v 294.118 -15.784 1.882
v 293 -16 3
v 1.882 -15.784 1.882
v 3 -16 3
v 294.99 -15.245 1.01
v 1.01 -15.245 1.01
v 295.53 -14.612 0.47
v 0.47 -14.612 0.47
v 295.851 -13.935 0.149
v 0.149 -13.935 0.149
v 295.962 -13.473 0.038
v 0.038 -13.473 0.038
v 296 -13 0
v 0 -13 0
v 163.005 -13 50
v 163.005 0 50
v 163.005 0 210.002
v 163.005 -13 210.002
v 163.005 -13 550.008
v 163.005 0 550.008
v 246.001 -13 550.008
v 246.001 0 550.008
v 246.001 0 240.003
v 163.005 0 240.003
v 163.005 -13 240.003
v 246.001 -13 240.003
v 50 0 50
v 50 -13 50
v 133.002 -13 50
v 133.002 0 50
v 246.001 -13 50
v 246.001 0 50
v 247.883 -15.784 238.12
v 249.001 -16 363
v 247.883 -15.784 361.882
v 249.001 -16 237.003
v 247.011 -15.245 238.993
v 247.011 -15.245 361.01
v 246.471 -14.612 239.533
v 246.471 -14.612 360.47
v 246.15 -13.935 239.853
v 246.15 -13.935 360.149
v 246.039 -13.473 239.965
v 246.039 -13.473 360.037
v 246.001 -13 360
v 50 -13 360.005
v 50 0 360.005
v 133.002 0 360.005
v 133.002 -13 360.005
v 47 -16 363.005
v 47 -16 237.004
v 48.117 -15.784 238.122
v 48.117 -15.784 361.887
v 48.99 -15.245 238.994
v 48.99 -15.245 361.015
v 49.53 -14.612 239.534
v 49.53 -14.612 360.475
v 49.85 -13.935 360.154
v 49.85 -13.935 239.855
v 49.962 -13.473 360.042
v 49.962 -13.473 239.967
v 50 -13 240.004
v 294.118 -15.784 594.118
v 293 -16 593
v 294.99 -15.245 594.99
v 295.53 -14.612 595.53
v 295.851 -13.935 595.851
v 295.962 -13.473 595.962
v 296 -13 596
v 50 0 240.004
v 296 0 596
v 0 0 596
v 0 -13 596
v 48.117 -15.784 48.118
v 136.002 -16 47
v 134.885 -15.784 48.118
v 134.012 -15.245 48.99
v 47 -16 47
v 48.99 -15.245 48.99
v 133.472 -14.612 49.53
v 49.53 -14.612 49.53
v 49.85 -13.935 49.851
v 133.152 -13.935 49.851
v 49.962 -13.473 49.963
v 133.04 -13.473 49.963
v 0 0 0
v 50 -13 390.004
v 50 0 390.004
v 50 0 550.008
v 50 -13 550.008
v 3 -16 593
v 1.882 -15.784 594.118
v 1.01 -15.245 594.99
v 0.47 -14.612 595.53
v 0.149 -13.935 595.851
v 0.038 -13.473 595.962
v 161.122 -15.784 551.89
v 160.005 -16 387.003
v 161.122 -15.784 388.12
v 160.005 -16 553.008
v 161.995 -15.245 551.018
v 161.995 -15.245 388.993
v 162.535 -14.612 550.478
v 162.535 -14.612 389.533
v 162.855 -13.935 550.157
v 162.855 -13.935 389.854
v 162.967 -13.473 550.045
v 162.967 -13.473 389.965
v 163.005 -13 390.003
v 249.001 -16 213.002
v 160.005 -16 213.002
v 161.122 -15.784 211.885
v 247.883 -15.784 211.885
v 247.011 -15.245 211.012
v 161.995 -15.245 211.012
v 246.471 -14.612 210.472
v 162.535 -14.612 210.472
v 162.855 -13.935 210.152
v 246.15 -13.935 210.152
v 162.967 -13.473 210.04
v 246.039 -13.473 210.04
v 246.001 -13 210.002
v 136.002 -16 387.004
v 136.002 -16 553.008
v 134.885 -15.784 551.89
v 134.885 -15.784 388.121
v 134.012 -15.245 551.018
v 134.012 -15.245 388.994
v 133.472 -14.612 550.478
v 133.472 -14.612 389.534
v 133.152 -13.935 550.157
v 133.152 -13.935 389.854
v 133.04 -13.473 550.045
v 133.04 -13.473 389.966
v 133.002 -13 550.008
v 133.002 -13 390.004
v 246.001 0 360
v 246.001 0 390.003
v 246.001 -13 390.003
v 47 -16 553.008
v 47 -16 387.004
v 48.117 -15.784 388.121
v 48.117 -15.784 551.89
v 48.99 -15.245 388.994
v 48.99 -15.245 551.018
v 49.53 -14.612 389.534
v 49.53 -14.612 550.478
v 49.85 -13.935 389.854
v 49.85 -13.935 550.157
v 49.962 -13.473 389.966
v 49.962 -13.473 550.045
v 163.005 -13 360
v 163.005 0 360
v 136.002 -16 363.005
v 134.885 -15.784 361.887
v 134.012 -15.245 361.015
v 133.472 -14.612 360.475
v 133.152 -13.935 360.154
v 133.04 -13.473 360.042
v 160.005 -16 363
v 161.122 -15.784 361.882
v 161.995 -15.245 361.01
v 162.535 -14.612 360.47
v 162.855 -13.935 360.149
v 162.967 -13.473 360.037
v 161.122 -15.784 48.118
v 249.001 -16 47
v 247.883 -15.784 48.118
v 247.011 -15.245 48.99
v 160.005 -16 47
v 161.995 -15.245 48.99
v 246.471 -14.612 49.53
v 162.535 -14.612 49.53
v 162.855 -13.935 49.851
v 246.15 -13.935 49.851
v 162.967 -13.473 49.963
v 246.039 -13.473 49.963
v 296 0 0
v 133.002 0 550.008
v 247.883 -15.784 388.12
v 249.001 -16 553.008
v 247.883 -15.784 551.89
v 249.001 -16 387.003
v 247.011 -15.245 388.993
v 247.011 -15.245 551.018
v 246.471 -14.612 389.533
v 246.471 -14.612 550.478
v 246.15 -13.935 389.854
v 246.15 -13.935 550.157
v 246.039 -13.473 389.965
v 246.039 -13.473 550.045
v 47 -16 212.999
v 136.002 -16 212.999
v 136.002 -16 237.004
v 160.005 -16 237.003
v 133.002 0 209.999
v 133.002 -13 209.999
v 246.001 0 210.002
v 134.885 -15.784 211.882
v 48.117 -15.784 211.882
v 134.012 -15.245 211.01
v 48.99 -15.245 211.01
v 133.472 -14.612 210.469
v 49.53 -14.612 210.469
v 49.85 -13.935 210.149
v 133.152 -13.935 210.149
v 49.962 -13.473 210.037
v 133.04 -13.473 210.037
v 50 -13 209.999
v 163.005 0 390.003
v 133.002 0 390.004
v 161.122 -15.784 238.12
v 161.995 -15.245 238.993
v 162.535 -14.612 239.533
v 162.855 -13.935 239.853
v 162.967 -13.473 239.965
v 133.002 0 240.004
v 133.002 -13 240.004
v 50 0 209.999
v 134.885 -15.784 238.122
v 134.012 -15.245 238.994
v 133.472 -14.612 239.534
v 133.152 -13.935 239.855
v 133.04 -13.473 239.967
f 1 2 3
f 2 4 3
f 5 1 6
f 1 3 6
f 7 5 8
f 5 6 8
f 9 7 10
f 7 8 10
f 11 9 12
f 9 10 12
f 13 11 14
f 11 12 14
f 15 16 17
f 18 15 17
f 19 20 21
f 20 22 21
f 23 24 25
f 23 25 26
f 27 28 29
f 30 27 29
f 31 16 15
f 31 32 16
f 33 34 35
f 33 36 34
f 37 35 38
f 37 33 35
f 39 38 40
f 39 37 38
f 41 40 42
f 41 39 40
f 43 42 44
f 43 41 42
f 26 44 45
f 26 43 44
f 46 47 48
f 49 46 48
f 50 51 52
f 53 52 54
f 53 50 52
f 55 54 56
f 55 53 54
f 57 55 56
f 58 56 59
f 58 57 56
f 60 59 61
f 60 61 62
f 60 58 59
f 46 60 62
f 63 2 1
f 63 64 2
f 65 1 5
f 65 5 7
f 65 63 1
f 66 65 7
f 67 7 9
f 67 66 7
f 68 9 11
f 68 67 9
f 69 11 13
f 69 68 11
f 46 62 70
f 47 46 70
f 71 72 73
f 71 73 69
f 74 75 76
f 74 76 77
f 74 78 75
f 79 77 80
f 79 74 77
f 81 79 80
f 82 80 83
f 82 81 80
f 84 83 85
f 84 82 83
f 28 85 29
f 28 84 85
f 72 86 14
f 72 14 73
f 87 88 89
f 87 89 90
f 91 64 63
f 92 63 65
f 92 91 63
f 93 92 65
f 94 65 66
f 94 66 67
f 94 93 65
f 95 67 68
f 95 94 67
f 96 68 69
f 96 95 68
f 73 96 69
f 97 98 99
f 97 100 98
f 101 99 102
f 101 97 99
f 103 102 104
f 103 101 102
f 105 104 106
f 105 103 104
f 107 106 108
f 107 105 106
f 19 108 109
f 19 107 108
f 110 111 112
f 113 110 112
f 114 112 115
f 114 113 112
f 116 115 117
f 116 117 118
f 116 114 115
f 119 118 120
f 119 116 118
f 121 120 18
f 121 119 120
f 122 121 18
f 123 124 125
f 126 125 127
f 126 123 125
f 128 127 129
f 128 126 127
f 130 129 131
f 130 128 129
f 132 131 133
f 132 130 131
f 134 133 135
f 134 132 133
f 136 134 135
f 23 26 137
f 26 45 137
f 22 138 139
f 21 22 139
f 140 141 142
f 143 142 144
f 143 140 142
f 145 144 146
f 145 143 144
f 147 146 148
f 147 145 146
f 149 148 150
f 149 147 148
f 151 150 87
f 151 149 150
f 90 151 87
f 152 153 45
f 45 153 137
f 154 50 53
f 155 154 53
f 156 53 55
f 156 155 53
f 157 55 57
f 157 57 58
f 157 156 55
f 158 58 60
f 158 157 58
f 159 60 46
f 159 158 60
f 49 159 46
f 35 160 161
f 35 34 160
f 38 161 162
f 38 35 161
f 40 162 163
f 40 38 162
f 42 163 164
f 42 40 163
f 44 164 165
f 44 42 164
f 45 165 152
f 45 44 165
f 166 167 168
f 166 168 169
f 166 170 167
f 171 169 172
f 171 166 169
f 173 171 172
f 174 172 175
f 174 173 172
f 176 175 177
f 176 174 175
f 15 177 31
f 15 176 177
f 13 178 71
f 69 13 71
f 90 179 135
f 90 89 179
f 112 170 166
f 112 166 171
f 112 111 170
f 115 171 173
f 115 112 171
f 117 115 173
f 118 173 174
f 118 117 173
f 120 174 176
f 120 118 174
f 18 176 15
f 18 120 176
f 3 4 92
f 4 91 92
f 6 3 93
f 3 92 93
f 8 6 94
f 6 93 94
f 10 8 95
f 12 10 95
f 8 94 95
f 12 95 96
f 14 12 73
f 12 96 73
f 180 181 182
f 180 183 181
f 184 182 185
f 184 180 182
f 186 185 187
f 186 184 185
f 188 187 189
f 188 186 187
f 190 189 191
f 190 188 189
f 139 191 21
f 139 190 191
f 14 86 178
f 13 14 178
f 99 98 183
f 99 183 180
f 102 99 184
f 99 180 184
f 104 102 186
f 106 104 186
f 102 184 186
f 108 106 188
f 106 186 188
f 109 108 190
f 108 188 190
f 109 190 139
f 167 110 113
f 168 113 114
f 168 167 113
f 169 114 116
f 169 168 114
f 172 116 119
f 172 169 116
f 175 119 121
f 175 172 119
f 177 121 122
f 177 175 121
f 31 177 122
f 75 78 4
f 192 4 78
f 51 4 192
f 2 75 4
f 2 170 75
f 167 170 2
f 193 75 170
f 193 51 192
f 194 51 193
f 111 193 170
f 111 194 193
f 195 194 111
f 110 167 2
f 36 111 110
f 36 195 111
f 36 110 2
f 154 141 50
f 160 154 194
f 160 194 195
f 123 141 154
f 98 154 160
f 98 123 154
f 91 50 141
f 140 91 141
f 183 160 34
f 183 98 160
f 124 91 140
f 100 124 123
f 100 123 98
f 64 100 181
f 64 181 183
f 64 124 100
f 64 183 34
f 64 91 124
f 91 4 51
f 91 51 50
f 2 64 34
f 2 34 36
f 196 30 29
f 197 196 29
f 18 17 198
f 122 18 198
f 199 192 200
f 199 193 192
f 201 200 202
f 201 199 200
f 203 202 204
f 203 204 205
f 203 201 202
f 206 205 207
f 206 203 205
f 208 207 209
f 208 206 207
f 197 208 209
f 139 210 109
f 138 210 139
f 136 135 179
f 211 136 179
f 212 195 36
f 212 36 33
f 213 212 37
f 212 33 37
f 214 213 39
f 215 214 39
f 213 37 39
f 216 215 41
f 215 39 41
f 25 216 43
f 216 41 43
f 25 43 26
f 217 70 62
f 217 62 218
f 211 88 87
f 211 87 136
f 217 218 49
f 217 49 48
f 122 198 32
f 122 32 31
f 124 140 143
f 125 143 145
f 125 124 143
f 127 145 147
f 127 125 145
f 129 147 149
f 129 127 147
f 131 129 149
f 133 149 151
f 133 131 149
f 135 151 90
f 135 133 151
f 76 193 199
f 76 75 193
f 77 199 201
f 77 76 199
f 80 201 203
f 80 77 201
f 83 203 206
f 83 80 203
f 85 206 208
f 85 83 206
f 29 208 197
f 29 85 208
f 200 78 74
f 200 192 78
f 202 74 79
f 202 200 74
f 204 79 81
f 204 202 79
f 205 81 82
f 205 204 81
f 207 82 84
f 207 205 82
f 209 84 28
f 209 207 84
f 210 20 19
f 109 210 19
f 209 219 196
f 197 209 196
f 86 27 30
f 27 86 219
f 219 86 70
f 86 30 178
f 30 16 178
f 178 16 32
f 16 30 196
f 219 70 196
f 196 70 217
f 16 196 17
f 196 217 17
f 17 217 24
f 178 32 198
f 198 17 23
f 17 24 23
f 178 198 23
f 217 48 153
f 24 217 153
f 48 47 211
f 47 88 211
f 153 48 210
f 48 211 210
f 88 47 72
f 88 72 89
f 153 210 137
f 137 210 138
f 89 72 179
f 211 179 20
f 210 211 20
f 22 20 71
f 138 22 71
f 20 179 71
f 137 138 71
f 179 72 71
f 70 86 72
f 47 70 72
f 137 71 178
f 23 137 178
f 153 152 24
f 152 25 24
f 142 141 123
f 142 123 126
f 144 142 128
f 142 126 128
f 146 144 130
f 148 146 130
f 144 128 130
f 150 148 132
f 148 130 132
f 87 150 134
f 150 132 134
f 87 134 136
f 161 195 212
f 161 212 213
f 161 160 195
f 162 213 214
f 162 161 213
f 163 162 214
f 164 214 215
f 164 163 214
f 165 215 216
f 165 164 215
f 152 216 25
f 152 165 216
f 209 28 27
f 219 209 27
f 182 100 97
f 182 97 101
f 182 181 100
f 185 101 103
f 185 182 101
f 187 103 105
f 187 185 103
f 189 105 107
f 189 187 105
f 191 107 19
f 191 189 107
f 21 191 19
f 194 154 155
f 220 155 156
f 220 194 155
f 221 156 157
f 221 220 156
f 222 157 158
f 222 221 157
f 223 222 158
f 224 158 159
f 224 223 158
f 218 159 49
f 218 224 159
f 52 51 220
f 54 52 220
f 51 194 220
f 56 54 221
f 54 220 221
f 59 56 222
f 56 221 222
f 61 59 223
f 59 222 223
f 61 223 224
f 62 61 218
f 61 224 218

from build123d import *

# Parameters (mm, degrees)
F0_W      = 28.8499742746
F0_H      = 37.8827601671
F1_DEPTH  = 16
F2_DEPTH  = 296
F3_DEPTH  = 996
F4_W      = 199.8313069344
F4_H      = 801.1276721954
F5_DEPTH  = 5
F6_DEPTH  = 39.21
F7_DEPTH  = 2.24
F8_DEPTH  = 55.66
F9_DEPTH  = 1.59
F10_W     = 54.77245152
F10_H     = 895.9976721954
F11_DEPTH = 5
F12_DEPTH = 5.86
F13_DEPTH = 18.91
F14_W     = 83.0026693535
F14_H     = 34.9487662315
F14_H_2   = 55.274695158
F15_W     = 82.9961860609
F15_H     = 44.8832511902
F15_H_2   = 52.5203943253
F16_DEPTH = 5
F17_DEPTH = 300
F18_DEPTH = 300
F19_DEPTH = 324.79
F20_DEPTH = 324.79
F21_DEPTH = 250
F22_DEPTH = 250
F23_DEPTH = 100
F24_DEPTH = 100
F25_DEPTH = 50
F26_DEPTH = 50
F27_DEPTH = 134.02
F28_DEPTH = 100
F29_DEPTH = 100
F30_DEPTH = 100
F31_DEPTH = 50
F32_DEPTH = 54.95
F33_DEPTH = 50
F34_DEPTH = 109.29
F35_DEPTH = 14.88
F36_DEPTH = 230.15
F37_DEPTH = 230.15
F38_DEPTH = 22.52
F39_DEPTH = 77.2
F40_DEPTH = 77.2
F41_DEPTH = 11
F42_DEPTH = 100
F43_DEPTH = 100
F44_DEPTH = 195.99
F45_DEPTH = 195.99
F46_DEPTH = 295.99
F47_DEPTH = 295.99
F48_DEPTH = 100
F49_DEPTH = 104.01
F50_DEPTH = 20
F51_DEPTH = 20
F52_DEPTH = 20
F53_DEPTH = 80
F54_DEPTH = 80
F55_DEPTH = 20
F56_DEPTH = 20
F57_DEPTH = 20
F58_DEPTH = 20
F59_R     = 3


with BuildPart() as f1:
    # F0 (on Front) → F1 (new body)
    with BuildSketch(Plane.XZ):
        with Locations((14.4249871373, 18.9413800836)):
            Rectangle(F0_W, F0_H)
    extrude(amount=F1_DEPTH)

    # F2 (add): a face of the model
    f2_faces = [f1.faces().sort_by_distance(p)[0] for p in [
        (0, -8, 18.9413800836),
    ]]
    extrude(f2_faces, amount=-F2_DEPTH)

    # F3 (add): a face of the model
    f3_faces = [f1.faces().sort_by_distance(p)[0] for p in [
        (148, -8, 0),
    ]]
    extrude(f3_faces, amount=-F3_DEPTH)

    # F4 (on face) → F5 (cut)
    with BuildSketch(Plane.XZ.offset(16)):
        with Locations((148.3252942562, 506.2239170074)):
            Rectangle(F4_W, F4_H)
    extrude(amount=-F5_DEPTH, mode=Mode.SUBTRACT)

    # F6 (cut): a face of the model
    f6_faces = [f1.faces().sort_by_distance(p)[0] for p in [
        (148.3252942562, -13.5, 906.7877531052),
    ]]
    extrude(f6_faces, amount=-F6_DEPTH, mode=Mode.SUBTRACT)

    # F7 (add): a face of the model
    f7_faces = [f1.faces().sort_by_distance(p)[0] for p in [
        (248.2409477234, -13.5, 525.8289170074),
    ]]
    extrude(f7_faces, amount=F7_DEPTH)

    # F8 (cut): a face of the model
    f8_faces = [f1.faces().sort_by_distance(p)[0] for p in [
        (147.2052942562, -13.5, 105.6600809097),
    ]]
    extrude(f8_faces, amount=-F8_DEPTH, mode=Mode.SUBTRACT)

    # F9 (add): a face of the model
    f9_faces = [f1.faces().sort_by_distance(p)[0] for p in [
        (48.409640789, -13.5, 497.9989170074),
    ]]
    extrude(f9_faces, amount=F9_DEPTH)

    # F10 (on face) → F11 (join)
    with BuildSketch(Plane.XZ.offset(11)):
        with Locations((154.5285359025, 497.9989170074)):
            Rectangle(F10_W, F10_H)
    extrude(amount=F11_DEPTH)

    # F12 (cut): a face of the model
    f12_faces = [f1.faces().sort_by_distance(p)[0] for p in [
        (127.1423101425, -13.5, 497.9989170074),
    ]]
    extrude(f12_faces, amount=-F12_DEPTH, mode=Mode.SUBTRACT)

    # F13 (cut): a face of the model
    f13_faces = [f1.faces().sort_by_distance(p)[0] for p in [
        (181.9147616625, -13.5, 497.9989170074),
    ]]
    extrude(f13_faces, amount=-F13_DEPTH, mode=Mode.SUBTRACT)

    # F14 (on face) + F15 (on face) → F16 (join)
    with BuildSketch(Plane.XZ.offset(11)):
        with Locations((91.5009754658, 853.3093035221)):
            Rectangle(F14_W, F14_H)
        with Locations((91.5009754658, 511.6568356752)):
            Rectangle(F14_W, F14_H_2)
    with BuildSketch(Plane.XZ.offset(11)):
        with Locations((204.5028546929, 853.7013530731)):
            Rectangle(F15_W, F15_H)
        with Locations((204.5028546929, 576.5425562859)):
            Rectangle(F15_W, F15_H_2)
    extrude(amount=F16_DEPTH)

    # F17 (add): faces of the model
    f17_faces = [f1.faces().sort_by_distance(p)[0] for p in [
        (204.5028546929, -13.5, 550.2823591232),
        (91.5009754658, -13.5, 484.0194880962),
    ]]
    extrude(f17_faces, amount=F17_DEPTH)

    # F18 (cut): faces of the model
    f18_faces = [f1.faces().sort_by_distance(p)[0] for p in [
        (91.5009754658, -13.5, 539.2941832542),
        (204.5028546929, -13.5, 602.8027534485),
    ]]
    extrude(f18_faces, amount=-F18_DEPTH, mode=Mode.SUBTRACT)

    # F19 (add): a face of the model
    f19_faces = [f1.faces().sort_by_distance(p)[0] for p in [
        (91.5009754658, -13.5, 835.8349204063),
    ]]
    extrude(f19_faces, amount=F19_DEPTH)

    # F20 (cut): a face of the model
    f20_faces = [f1.faces().sort_by_distance(p)[0] for p in [
        (91.5009754658, -13.5, 870.7836866379),
    ]]
    extrude(f20_faces, amount=-F20_DEPTH, mode=Mode.SUBTRACT)

    # F21 (add): a face of the model
    f21_faces = [f1.faces().sort_by_distance(p)[0] for p in [
        (91.5009754658, -13.5, 239.2941832542),
    ]]
    extrude(f21_faces, amount=F21_DEPTH)

    # F22 (cut): a face of the model
    f22_faces = [f1.faces().sort_by_distance(p)[0] for p in [
        (91.5009754658, -13.5, 184.0194880962),
    ]]
    extrude(f22_faces, amount=-F22_DEPTH, mode=Mode.SUBTRACT)

    # F23 (add): a face of the model
    f23_faces = [f1.faces().sort_by_distance(p)[0] for p in [
        (91.5009754658, -13.5, 545.9936866379),
    ]]
    extrude(f23_faces, amount=F23_DEPTH)

    # F24 (cut): a face of the model
    f24_faces = [f1.faces().sort_by_distance(p)[0] for p in [
        (91.5009754658, -13.5, 511.0449204063),
    ]]
    extrude(f24_faces, amount=-F24_DEPTH, mode=Mode.SUBTRACT)

    # F25 (add): a face of the model
    f25_faces = [f1.faces().sort_by_distance(p)[0] for p in [
        (91.5009754658, -13.5, 645.9936866379),
    ]]
    extrude(f25_faces, amount=F25_DEPTH)

    # F26 (cut): a face of the model
    f26_faces = [f1.faces().sort_by_distance(p)[0] for p in [
        (91.5009754658, -13.5, 611.0449204063),
    ]]
    extrude(f26_faces, amount=-F26_DEPTH, mode=Mode.SUBTRACT)

    # F27 (add): a face of the model
    f27_faces = [f1.faces().sort_by_distance(p)[0] for p in [
        (91.5009754658, -13.5, 434.0194880962),
    ]]
    extrude(f27_faces, amount=F27_DEPTH)

    # F28 (cut): a face of the model
    f28_faces = [f1.faces().sort_by_distance(p)[0] for p in [
        (91.5009754658, -13.5, 299.9994880962),
    ]]
    extrude(f28_faces, amount=-F28_DEPTH, mode=Mode.SUBTRACT)

    # F29 (add): a face of the model
    f29_faces = [f1.faces().sort_by_distance(p)[0] for p in [
        (91.5009754658, -13.5, 661.0449204063),
    ]]
    extrude(f29_faces, amount=F29_DEPTH)

    # F30 (cut): a face of the model
    f30_faces = [f1.faces().sort_by_distance(p)[0] for p in [
        (91.5009754658, -13.5, 695.9936866379),
    ]]
    extrude(f30_faces, amount=-F30_DEPTH, mode=Mode.SUBTRACT)

    # F31 (add): a face of the model
    f31_faces = [f1.faces().sort_by_distance(p)[0] for p in [
        (91.5009754658, -13.5, 595.9936866379),
    ]]
    extrude(f31_faces, amount=F31_DEPTH)

    # F32 (cut): a face of the model
    f32_faces = [f1.faces().sort_by_distance(p)[0] for p in [
        (91.5009754658, -13.5, 561.0449204063),
    ]]
    extrude(f32_faces, amount=-F32_DEPTH, mode=Mode.SUBTRACT)

    # F33 (add): a face of the model
    f33_faces = [f1.faces().sort_by_distance(p)[0] for p in [
        (91.5009754658, -13.5, 399.9994880962),
    ]]
    extrude(f33_faces, amount=F33_DEPTH)

    # F34 (cut): a face of the model
    f34_faces = [f1.faces().sort_by_distance(p)[0] for p in [
        (91.5009754658, -13.5, 489.2941832542),
    ]]
    extrude(f34_faces, amount=-F34_DEPTH, mode=Mode.SUBTRACT)

    # F35 (cut): a face of the model
    f35_faces = [f1.faces().sort_by_distance(p)[0] for p in [
        (204.5028546929, -13.5, 831.259727478),
    ]]
    extrude(f35_faces, amount=-F35_DEPTH, mode=Mode.SUBTRACT)

    # F36 (add): a face of the model
    f36_faces = [f1.faces().sort_by_distance(p)[0] for p in [
        (204.5028546929, -13.5, 846.139727478),
    ]]
    extrude(f36_faces, amount=F36_DEPTH)

    # F37 (cut): a face of the model
    f37_faces = [f1.faces().sort_by_distance(p)[0] for p in [
        (204.5028546929, -13.5, 876.1429786682),
    ]]
    extrude(f37_faces, amount=-F37_DEPTH, mode=Mode.SUBTRACT)

    # F38 (cut): a face of the model
    f38_faces = [f1.faces().sort_by_distance(p)[0] for p in [
        (204.5028546929, -13.5, 250.2823591232),
    ]]
    extrude(f38_faces, amount=-F38_DEPTH, mode=Mode.SUBTRACT)

    # F39 (add): a face of the model
    f39_faces = [f1.faces().sort_by_distance(p)[0] for p in [
        (204.5028546929, -13.5, 302.8027534485),
    ]]
    extrude(f39_faces, amount=F39_DEPTH)

    # F40 (cut): a face of the model
    f40_faces = [f1.faces().sort_by_distance(p)[0] for p in [
        (204.5028546929, -13.5, 272.8023591232),
    ]]
    extrude(f40_faces, amount=-F40_DEPTH, mode=Mode.SUBTRACT)

    # F41 (cut): faces of the model
    f41_faces = [f1.faces().sort_by_distance(p)[0] for p in [
        (91.5009754658, -11, 795.9957198715),
        (204.5028546929, -11, 795.9953658867),
        (204.5028546929, -11, 497.9962404633),
        (91.5009754658, -11, 497.9995518303),
        (91.5009754658, -11, 199.999784503),
        (204.5028546929, -11, 200.0012200165),
    ]]
    extrude(f41_faces, amount=-F41_DEPTH, mode=Mode.SUBTRACT)

    # F42 (add): faces of the model
    f42_faces = [f1.faces().sort_by_distance(p)[0] for p in [
        (91.5009754658, -8, 349.9994880962),
        (204.5028546929, -8, 350.0023591232),
    ]]
    extrude(f42_faces, amount=F42_DEPTH)

    # F43 (cut): faces of the model
    f43_faces = [f1.faces().sort_by_distance(p)[0] for p in [
        (91.5009754658, -8, 380.0041832542),
        (204.5028546929, -8, 380.0027534485),
    ]]
    extrude(f43_faces, amount=-F43_DEPTH, mode=Mode.SUBTRACT)

    # F44 (add): faces of the model
    f44_faces = [f1.faces().sort_by_distance(p)[0] for p in [
        (91.5009754658, -8, 615.9949204063),
        (204.5028546929, -8, 615.989727478),
    ]]
    extrude(f44_faces, amount=F44_DEPTH)

    # F45 (cut): faces of the model
    f45_faces = [f1.faces().sort_by_distance(p)[0] for p in [
        (91.5009754658, -8, 645.9936866379),
        (204.5028546929, -8, 645.9929786682),
    ]]
    extrude(f45_faces, amount=-F45_DEPTH, mode=Mode.SUBTRACT)

    # F46 (add): faces of the model
    f46_faces = [f1.faces().sort_by_distance(p)[0] for p in [
        (91.5009754658, -8, 945.9977531052),
        (204.5028546929, -8, 945.9977531052),
    ]]
    extrude(f46_faces, amount=F46_DEPTH)

    # F47 (cut): a face of the model
    f47_faces = [f1.faces().sort_by_distance(p)[0] for p in [
        (148, -8, 996),
    ]]
    extrude(f47_faces, amount=-F47_DEPTH, mode=Mode.SUBTRACT)

    # F48 (add): faces of the model
    f48_faces = [f1.faces().sort_by_distance(p)[0] for p in [
        (204.5028546929, -8, 650.0077531052),
        (91.5009754658, -8, 650.0077531052),
    ]]
    extrude(f48_faces, amount=F48_DEPTH)

    # F49 (cut): a face of the model
    f49_faces = [f1.faces().sort_by_distance(p)[0] for p in [
        (148, -8, 700.01),
    ]]
    extrude(f49_faces, amount=-F49_DEPTH, mode=Mode.SUBTRACT)

    # F50 (add): a face of the model
    f50_faces = [f1.faces().sort_by_distance(p)[0] for p in [
        (91.5009754658, -8, 249.9994880962),
    ]]
    extrude(f50_faces, amount=F50_DEPTH)

    # F51 (add): a face of the model
    f51_faces = [f1.faces().sort_by_distance(p)[0] for p in [
        (204.5028546929, -8, 250.0023591232),
    ]]
    extrude(f51_faces, amount=F51_DEPTH)

    # F52 (cut): faces of the model
    f52_faces = [f1.faces().sort_by_distance(p)[0] for p in [
        (91.5009754658, -8, 280.0041832542),
        (204.5028546929, -8, 280.0027534485),
    ]]
    extrude(f52_faces, amount=-F52_DEPTH, mode=Mode.SUBTRACT)

    # F53 (add): faces of the model
    f53_faces = [f1.faces().sort_by_distance(p)[0] for p in [
        (204.5028546929, -8, 419.999727478),
        (91.5009754658, -8, 420.0049204063),
    ]]
    extrude(f53_faces, amount=F53_DEPTH)

    # F54 (cut): faces of the model
    f54_faces = [f1.faces().sort_by_distance(p)[0] for p in [
        (91.5009754658, -8, 450.0036866379),
        (204.5028546929, -8, 450.0029786682),
    ]]
    extrude(f54_faces, amount=-F54_DEPTH, mode=Mode.SUBTRACT)

    # F55 (add): faces of the model
    f55_faces = [f1.faces().sort_by_distance(p)[0] for p in [
        (204.5028546929, -8, 370.0029786682),
        (91.5009754658, -8, 370.0036866379),
    ]]
    extrude(f55_faces, amount=F55_DEPTH)

    # F56 (cut): faces of the model
    f56_faces = [f1.faces().sort_by_distance(p)[0] for p in [
        (91.5009754658, -8, 340.0049204063),
        (204.5028546929, -8, 339.999727478),
    ]]
    extrude(f56_faces, amount=-F56_DEPTH, mode=Mode.SUBTRACT)

    # F57 (add): faces of the model
    f57_faces = [f1.faces().sort_by_distance(p)[0] for p in [
        (204.5028546929, -8, 230.0023591232),
        (91.5009754658, -8, 229.9994880962),
    ]]
    extrude(f57_faces, amount=F57_DEPTH)

    # F58 (cut): faces of the model
    f58_faces = [f1.faces().sort_by_distance(p)[0] for p in [
        (204.5028546929, -8, 260.0027534485),
        (91.5009754658, -8, 260.0041832542),
    ]]
    extrude(f58_faces, amount=-F58_DEPTH, mode=Mode.SUBTRACT)

    # F59
    f59_edges = [f1.edges().sort_by_distance(p)[0] for p in [
        (0, -16, 298),
        (148, -16, 0),
        (296, -16, 298),
        (148, -16, 596),
        (133.00231, -16, 129.999785),
        (91.500975, -16, 50.000081),
        (49.999641, -16, 129.999785),
        (91.500975, -16, 209.999488),
        (246.000948, -16, 130.00122),
        (204.502855, -16, 50.000081),
        (163.004762, -16, 130.00122),
        (204.502855, -16, 210.002359),
        (246.000948, -16, 300.00124),
        (204.502855, -16, 240.002753),
        (163.004762, -16, 300.00124),
        (204.502855, -16, 359.999727),
        (133.00231, -16, 300.004552),
        (91.500975, -16, 240.004183),
        (49.999641, -16, 300.004552),
        (91.500975, -16, 360.00492),
        (49.999641, -16, 470.00572),
        (91.500975, -16, 550.007753),
        (133.00231, -16, 470.00572),
        (91.500975, -16, 390.003687),
        (163.004762, -16, 470.005366),
        (204.502855, -16, 550.007753),
        (246.000948, -16, 470.005366),
        (204.502855, -16, 390.002979),
    ]]
    fillet(f59_edges, radius=F59_R)


solid = f1.part
